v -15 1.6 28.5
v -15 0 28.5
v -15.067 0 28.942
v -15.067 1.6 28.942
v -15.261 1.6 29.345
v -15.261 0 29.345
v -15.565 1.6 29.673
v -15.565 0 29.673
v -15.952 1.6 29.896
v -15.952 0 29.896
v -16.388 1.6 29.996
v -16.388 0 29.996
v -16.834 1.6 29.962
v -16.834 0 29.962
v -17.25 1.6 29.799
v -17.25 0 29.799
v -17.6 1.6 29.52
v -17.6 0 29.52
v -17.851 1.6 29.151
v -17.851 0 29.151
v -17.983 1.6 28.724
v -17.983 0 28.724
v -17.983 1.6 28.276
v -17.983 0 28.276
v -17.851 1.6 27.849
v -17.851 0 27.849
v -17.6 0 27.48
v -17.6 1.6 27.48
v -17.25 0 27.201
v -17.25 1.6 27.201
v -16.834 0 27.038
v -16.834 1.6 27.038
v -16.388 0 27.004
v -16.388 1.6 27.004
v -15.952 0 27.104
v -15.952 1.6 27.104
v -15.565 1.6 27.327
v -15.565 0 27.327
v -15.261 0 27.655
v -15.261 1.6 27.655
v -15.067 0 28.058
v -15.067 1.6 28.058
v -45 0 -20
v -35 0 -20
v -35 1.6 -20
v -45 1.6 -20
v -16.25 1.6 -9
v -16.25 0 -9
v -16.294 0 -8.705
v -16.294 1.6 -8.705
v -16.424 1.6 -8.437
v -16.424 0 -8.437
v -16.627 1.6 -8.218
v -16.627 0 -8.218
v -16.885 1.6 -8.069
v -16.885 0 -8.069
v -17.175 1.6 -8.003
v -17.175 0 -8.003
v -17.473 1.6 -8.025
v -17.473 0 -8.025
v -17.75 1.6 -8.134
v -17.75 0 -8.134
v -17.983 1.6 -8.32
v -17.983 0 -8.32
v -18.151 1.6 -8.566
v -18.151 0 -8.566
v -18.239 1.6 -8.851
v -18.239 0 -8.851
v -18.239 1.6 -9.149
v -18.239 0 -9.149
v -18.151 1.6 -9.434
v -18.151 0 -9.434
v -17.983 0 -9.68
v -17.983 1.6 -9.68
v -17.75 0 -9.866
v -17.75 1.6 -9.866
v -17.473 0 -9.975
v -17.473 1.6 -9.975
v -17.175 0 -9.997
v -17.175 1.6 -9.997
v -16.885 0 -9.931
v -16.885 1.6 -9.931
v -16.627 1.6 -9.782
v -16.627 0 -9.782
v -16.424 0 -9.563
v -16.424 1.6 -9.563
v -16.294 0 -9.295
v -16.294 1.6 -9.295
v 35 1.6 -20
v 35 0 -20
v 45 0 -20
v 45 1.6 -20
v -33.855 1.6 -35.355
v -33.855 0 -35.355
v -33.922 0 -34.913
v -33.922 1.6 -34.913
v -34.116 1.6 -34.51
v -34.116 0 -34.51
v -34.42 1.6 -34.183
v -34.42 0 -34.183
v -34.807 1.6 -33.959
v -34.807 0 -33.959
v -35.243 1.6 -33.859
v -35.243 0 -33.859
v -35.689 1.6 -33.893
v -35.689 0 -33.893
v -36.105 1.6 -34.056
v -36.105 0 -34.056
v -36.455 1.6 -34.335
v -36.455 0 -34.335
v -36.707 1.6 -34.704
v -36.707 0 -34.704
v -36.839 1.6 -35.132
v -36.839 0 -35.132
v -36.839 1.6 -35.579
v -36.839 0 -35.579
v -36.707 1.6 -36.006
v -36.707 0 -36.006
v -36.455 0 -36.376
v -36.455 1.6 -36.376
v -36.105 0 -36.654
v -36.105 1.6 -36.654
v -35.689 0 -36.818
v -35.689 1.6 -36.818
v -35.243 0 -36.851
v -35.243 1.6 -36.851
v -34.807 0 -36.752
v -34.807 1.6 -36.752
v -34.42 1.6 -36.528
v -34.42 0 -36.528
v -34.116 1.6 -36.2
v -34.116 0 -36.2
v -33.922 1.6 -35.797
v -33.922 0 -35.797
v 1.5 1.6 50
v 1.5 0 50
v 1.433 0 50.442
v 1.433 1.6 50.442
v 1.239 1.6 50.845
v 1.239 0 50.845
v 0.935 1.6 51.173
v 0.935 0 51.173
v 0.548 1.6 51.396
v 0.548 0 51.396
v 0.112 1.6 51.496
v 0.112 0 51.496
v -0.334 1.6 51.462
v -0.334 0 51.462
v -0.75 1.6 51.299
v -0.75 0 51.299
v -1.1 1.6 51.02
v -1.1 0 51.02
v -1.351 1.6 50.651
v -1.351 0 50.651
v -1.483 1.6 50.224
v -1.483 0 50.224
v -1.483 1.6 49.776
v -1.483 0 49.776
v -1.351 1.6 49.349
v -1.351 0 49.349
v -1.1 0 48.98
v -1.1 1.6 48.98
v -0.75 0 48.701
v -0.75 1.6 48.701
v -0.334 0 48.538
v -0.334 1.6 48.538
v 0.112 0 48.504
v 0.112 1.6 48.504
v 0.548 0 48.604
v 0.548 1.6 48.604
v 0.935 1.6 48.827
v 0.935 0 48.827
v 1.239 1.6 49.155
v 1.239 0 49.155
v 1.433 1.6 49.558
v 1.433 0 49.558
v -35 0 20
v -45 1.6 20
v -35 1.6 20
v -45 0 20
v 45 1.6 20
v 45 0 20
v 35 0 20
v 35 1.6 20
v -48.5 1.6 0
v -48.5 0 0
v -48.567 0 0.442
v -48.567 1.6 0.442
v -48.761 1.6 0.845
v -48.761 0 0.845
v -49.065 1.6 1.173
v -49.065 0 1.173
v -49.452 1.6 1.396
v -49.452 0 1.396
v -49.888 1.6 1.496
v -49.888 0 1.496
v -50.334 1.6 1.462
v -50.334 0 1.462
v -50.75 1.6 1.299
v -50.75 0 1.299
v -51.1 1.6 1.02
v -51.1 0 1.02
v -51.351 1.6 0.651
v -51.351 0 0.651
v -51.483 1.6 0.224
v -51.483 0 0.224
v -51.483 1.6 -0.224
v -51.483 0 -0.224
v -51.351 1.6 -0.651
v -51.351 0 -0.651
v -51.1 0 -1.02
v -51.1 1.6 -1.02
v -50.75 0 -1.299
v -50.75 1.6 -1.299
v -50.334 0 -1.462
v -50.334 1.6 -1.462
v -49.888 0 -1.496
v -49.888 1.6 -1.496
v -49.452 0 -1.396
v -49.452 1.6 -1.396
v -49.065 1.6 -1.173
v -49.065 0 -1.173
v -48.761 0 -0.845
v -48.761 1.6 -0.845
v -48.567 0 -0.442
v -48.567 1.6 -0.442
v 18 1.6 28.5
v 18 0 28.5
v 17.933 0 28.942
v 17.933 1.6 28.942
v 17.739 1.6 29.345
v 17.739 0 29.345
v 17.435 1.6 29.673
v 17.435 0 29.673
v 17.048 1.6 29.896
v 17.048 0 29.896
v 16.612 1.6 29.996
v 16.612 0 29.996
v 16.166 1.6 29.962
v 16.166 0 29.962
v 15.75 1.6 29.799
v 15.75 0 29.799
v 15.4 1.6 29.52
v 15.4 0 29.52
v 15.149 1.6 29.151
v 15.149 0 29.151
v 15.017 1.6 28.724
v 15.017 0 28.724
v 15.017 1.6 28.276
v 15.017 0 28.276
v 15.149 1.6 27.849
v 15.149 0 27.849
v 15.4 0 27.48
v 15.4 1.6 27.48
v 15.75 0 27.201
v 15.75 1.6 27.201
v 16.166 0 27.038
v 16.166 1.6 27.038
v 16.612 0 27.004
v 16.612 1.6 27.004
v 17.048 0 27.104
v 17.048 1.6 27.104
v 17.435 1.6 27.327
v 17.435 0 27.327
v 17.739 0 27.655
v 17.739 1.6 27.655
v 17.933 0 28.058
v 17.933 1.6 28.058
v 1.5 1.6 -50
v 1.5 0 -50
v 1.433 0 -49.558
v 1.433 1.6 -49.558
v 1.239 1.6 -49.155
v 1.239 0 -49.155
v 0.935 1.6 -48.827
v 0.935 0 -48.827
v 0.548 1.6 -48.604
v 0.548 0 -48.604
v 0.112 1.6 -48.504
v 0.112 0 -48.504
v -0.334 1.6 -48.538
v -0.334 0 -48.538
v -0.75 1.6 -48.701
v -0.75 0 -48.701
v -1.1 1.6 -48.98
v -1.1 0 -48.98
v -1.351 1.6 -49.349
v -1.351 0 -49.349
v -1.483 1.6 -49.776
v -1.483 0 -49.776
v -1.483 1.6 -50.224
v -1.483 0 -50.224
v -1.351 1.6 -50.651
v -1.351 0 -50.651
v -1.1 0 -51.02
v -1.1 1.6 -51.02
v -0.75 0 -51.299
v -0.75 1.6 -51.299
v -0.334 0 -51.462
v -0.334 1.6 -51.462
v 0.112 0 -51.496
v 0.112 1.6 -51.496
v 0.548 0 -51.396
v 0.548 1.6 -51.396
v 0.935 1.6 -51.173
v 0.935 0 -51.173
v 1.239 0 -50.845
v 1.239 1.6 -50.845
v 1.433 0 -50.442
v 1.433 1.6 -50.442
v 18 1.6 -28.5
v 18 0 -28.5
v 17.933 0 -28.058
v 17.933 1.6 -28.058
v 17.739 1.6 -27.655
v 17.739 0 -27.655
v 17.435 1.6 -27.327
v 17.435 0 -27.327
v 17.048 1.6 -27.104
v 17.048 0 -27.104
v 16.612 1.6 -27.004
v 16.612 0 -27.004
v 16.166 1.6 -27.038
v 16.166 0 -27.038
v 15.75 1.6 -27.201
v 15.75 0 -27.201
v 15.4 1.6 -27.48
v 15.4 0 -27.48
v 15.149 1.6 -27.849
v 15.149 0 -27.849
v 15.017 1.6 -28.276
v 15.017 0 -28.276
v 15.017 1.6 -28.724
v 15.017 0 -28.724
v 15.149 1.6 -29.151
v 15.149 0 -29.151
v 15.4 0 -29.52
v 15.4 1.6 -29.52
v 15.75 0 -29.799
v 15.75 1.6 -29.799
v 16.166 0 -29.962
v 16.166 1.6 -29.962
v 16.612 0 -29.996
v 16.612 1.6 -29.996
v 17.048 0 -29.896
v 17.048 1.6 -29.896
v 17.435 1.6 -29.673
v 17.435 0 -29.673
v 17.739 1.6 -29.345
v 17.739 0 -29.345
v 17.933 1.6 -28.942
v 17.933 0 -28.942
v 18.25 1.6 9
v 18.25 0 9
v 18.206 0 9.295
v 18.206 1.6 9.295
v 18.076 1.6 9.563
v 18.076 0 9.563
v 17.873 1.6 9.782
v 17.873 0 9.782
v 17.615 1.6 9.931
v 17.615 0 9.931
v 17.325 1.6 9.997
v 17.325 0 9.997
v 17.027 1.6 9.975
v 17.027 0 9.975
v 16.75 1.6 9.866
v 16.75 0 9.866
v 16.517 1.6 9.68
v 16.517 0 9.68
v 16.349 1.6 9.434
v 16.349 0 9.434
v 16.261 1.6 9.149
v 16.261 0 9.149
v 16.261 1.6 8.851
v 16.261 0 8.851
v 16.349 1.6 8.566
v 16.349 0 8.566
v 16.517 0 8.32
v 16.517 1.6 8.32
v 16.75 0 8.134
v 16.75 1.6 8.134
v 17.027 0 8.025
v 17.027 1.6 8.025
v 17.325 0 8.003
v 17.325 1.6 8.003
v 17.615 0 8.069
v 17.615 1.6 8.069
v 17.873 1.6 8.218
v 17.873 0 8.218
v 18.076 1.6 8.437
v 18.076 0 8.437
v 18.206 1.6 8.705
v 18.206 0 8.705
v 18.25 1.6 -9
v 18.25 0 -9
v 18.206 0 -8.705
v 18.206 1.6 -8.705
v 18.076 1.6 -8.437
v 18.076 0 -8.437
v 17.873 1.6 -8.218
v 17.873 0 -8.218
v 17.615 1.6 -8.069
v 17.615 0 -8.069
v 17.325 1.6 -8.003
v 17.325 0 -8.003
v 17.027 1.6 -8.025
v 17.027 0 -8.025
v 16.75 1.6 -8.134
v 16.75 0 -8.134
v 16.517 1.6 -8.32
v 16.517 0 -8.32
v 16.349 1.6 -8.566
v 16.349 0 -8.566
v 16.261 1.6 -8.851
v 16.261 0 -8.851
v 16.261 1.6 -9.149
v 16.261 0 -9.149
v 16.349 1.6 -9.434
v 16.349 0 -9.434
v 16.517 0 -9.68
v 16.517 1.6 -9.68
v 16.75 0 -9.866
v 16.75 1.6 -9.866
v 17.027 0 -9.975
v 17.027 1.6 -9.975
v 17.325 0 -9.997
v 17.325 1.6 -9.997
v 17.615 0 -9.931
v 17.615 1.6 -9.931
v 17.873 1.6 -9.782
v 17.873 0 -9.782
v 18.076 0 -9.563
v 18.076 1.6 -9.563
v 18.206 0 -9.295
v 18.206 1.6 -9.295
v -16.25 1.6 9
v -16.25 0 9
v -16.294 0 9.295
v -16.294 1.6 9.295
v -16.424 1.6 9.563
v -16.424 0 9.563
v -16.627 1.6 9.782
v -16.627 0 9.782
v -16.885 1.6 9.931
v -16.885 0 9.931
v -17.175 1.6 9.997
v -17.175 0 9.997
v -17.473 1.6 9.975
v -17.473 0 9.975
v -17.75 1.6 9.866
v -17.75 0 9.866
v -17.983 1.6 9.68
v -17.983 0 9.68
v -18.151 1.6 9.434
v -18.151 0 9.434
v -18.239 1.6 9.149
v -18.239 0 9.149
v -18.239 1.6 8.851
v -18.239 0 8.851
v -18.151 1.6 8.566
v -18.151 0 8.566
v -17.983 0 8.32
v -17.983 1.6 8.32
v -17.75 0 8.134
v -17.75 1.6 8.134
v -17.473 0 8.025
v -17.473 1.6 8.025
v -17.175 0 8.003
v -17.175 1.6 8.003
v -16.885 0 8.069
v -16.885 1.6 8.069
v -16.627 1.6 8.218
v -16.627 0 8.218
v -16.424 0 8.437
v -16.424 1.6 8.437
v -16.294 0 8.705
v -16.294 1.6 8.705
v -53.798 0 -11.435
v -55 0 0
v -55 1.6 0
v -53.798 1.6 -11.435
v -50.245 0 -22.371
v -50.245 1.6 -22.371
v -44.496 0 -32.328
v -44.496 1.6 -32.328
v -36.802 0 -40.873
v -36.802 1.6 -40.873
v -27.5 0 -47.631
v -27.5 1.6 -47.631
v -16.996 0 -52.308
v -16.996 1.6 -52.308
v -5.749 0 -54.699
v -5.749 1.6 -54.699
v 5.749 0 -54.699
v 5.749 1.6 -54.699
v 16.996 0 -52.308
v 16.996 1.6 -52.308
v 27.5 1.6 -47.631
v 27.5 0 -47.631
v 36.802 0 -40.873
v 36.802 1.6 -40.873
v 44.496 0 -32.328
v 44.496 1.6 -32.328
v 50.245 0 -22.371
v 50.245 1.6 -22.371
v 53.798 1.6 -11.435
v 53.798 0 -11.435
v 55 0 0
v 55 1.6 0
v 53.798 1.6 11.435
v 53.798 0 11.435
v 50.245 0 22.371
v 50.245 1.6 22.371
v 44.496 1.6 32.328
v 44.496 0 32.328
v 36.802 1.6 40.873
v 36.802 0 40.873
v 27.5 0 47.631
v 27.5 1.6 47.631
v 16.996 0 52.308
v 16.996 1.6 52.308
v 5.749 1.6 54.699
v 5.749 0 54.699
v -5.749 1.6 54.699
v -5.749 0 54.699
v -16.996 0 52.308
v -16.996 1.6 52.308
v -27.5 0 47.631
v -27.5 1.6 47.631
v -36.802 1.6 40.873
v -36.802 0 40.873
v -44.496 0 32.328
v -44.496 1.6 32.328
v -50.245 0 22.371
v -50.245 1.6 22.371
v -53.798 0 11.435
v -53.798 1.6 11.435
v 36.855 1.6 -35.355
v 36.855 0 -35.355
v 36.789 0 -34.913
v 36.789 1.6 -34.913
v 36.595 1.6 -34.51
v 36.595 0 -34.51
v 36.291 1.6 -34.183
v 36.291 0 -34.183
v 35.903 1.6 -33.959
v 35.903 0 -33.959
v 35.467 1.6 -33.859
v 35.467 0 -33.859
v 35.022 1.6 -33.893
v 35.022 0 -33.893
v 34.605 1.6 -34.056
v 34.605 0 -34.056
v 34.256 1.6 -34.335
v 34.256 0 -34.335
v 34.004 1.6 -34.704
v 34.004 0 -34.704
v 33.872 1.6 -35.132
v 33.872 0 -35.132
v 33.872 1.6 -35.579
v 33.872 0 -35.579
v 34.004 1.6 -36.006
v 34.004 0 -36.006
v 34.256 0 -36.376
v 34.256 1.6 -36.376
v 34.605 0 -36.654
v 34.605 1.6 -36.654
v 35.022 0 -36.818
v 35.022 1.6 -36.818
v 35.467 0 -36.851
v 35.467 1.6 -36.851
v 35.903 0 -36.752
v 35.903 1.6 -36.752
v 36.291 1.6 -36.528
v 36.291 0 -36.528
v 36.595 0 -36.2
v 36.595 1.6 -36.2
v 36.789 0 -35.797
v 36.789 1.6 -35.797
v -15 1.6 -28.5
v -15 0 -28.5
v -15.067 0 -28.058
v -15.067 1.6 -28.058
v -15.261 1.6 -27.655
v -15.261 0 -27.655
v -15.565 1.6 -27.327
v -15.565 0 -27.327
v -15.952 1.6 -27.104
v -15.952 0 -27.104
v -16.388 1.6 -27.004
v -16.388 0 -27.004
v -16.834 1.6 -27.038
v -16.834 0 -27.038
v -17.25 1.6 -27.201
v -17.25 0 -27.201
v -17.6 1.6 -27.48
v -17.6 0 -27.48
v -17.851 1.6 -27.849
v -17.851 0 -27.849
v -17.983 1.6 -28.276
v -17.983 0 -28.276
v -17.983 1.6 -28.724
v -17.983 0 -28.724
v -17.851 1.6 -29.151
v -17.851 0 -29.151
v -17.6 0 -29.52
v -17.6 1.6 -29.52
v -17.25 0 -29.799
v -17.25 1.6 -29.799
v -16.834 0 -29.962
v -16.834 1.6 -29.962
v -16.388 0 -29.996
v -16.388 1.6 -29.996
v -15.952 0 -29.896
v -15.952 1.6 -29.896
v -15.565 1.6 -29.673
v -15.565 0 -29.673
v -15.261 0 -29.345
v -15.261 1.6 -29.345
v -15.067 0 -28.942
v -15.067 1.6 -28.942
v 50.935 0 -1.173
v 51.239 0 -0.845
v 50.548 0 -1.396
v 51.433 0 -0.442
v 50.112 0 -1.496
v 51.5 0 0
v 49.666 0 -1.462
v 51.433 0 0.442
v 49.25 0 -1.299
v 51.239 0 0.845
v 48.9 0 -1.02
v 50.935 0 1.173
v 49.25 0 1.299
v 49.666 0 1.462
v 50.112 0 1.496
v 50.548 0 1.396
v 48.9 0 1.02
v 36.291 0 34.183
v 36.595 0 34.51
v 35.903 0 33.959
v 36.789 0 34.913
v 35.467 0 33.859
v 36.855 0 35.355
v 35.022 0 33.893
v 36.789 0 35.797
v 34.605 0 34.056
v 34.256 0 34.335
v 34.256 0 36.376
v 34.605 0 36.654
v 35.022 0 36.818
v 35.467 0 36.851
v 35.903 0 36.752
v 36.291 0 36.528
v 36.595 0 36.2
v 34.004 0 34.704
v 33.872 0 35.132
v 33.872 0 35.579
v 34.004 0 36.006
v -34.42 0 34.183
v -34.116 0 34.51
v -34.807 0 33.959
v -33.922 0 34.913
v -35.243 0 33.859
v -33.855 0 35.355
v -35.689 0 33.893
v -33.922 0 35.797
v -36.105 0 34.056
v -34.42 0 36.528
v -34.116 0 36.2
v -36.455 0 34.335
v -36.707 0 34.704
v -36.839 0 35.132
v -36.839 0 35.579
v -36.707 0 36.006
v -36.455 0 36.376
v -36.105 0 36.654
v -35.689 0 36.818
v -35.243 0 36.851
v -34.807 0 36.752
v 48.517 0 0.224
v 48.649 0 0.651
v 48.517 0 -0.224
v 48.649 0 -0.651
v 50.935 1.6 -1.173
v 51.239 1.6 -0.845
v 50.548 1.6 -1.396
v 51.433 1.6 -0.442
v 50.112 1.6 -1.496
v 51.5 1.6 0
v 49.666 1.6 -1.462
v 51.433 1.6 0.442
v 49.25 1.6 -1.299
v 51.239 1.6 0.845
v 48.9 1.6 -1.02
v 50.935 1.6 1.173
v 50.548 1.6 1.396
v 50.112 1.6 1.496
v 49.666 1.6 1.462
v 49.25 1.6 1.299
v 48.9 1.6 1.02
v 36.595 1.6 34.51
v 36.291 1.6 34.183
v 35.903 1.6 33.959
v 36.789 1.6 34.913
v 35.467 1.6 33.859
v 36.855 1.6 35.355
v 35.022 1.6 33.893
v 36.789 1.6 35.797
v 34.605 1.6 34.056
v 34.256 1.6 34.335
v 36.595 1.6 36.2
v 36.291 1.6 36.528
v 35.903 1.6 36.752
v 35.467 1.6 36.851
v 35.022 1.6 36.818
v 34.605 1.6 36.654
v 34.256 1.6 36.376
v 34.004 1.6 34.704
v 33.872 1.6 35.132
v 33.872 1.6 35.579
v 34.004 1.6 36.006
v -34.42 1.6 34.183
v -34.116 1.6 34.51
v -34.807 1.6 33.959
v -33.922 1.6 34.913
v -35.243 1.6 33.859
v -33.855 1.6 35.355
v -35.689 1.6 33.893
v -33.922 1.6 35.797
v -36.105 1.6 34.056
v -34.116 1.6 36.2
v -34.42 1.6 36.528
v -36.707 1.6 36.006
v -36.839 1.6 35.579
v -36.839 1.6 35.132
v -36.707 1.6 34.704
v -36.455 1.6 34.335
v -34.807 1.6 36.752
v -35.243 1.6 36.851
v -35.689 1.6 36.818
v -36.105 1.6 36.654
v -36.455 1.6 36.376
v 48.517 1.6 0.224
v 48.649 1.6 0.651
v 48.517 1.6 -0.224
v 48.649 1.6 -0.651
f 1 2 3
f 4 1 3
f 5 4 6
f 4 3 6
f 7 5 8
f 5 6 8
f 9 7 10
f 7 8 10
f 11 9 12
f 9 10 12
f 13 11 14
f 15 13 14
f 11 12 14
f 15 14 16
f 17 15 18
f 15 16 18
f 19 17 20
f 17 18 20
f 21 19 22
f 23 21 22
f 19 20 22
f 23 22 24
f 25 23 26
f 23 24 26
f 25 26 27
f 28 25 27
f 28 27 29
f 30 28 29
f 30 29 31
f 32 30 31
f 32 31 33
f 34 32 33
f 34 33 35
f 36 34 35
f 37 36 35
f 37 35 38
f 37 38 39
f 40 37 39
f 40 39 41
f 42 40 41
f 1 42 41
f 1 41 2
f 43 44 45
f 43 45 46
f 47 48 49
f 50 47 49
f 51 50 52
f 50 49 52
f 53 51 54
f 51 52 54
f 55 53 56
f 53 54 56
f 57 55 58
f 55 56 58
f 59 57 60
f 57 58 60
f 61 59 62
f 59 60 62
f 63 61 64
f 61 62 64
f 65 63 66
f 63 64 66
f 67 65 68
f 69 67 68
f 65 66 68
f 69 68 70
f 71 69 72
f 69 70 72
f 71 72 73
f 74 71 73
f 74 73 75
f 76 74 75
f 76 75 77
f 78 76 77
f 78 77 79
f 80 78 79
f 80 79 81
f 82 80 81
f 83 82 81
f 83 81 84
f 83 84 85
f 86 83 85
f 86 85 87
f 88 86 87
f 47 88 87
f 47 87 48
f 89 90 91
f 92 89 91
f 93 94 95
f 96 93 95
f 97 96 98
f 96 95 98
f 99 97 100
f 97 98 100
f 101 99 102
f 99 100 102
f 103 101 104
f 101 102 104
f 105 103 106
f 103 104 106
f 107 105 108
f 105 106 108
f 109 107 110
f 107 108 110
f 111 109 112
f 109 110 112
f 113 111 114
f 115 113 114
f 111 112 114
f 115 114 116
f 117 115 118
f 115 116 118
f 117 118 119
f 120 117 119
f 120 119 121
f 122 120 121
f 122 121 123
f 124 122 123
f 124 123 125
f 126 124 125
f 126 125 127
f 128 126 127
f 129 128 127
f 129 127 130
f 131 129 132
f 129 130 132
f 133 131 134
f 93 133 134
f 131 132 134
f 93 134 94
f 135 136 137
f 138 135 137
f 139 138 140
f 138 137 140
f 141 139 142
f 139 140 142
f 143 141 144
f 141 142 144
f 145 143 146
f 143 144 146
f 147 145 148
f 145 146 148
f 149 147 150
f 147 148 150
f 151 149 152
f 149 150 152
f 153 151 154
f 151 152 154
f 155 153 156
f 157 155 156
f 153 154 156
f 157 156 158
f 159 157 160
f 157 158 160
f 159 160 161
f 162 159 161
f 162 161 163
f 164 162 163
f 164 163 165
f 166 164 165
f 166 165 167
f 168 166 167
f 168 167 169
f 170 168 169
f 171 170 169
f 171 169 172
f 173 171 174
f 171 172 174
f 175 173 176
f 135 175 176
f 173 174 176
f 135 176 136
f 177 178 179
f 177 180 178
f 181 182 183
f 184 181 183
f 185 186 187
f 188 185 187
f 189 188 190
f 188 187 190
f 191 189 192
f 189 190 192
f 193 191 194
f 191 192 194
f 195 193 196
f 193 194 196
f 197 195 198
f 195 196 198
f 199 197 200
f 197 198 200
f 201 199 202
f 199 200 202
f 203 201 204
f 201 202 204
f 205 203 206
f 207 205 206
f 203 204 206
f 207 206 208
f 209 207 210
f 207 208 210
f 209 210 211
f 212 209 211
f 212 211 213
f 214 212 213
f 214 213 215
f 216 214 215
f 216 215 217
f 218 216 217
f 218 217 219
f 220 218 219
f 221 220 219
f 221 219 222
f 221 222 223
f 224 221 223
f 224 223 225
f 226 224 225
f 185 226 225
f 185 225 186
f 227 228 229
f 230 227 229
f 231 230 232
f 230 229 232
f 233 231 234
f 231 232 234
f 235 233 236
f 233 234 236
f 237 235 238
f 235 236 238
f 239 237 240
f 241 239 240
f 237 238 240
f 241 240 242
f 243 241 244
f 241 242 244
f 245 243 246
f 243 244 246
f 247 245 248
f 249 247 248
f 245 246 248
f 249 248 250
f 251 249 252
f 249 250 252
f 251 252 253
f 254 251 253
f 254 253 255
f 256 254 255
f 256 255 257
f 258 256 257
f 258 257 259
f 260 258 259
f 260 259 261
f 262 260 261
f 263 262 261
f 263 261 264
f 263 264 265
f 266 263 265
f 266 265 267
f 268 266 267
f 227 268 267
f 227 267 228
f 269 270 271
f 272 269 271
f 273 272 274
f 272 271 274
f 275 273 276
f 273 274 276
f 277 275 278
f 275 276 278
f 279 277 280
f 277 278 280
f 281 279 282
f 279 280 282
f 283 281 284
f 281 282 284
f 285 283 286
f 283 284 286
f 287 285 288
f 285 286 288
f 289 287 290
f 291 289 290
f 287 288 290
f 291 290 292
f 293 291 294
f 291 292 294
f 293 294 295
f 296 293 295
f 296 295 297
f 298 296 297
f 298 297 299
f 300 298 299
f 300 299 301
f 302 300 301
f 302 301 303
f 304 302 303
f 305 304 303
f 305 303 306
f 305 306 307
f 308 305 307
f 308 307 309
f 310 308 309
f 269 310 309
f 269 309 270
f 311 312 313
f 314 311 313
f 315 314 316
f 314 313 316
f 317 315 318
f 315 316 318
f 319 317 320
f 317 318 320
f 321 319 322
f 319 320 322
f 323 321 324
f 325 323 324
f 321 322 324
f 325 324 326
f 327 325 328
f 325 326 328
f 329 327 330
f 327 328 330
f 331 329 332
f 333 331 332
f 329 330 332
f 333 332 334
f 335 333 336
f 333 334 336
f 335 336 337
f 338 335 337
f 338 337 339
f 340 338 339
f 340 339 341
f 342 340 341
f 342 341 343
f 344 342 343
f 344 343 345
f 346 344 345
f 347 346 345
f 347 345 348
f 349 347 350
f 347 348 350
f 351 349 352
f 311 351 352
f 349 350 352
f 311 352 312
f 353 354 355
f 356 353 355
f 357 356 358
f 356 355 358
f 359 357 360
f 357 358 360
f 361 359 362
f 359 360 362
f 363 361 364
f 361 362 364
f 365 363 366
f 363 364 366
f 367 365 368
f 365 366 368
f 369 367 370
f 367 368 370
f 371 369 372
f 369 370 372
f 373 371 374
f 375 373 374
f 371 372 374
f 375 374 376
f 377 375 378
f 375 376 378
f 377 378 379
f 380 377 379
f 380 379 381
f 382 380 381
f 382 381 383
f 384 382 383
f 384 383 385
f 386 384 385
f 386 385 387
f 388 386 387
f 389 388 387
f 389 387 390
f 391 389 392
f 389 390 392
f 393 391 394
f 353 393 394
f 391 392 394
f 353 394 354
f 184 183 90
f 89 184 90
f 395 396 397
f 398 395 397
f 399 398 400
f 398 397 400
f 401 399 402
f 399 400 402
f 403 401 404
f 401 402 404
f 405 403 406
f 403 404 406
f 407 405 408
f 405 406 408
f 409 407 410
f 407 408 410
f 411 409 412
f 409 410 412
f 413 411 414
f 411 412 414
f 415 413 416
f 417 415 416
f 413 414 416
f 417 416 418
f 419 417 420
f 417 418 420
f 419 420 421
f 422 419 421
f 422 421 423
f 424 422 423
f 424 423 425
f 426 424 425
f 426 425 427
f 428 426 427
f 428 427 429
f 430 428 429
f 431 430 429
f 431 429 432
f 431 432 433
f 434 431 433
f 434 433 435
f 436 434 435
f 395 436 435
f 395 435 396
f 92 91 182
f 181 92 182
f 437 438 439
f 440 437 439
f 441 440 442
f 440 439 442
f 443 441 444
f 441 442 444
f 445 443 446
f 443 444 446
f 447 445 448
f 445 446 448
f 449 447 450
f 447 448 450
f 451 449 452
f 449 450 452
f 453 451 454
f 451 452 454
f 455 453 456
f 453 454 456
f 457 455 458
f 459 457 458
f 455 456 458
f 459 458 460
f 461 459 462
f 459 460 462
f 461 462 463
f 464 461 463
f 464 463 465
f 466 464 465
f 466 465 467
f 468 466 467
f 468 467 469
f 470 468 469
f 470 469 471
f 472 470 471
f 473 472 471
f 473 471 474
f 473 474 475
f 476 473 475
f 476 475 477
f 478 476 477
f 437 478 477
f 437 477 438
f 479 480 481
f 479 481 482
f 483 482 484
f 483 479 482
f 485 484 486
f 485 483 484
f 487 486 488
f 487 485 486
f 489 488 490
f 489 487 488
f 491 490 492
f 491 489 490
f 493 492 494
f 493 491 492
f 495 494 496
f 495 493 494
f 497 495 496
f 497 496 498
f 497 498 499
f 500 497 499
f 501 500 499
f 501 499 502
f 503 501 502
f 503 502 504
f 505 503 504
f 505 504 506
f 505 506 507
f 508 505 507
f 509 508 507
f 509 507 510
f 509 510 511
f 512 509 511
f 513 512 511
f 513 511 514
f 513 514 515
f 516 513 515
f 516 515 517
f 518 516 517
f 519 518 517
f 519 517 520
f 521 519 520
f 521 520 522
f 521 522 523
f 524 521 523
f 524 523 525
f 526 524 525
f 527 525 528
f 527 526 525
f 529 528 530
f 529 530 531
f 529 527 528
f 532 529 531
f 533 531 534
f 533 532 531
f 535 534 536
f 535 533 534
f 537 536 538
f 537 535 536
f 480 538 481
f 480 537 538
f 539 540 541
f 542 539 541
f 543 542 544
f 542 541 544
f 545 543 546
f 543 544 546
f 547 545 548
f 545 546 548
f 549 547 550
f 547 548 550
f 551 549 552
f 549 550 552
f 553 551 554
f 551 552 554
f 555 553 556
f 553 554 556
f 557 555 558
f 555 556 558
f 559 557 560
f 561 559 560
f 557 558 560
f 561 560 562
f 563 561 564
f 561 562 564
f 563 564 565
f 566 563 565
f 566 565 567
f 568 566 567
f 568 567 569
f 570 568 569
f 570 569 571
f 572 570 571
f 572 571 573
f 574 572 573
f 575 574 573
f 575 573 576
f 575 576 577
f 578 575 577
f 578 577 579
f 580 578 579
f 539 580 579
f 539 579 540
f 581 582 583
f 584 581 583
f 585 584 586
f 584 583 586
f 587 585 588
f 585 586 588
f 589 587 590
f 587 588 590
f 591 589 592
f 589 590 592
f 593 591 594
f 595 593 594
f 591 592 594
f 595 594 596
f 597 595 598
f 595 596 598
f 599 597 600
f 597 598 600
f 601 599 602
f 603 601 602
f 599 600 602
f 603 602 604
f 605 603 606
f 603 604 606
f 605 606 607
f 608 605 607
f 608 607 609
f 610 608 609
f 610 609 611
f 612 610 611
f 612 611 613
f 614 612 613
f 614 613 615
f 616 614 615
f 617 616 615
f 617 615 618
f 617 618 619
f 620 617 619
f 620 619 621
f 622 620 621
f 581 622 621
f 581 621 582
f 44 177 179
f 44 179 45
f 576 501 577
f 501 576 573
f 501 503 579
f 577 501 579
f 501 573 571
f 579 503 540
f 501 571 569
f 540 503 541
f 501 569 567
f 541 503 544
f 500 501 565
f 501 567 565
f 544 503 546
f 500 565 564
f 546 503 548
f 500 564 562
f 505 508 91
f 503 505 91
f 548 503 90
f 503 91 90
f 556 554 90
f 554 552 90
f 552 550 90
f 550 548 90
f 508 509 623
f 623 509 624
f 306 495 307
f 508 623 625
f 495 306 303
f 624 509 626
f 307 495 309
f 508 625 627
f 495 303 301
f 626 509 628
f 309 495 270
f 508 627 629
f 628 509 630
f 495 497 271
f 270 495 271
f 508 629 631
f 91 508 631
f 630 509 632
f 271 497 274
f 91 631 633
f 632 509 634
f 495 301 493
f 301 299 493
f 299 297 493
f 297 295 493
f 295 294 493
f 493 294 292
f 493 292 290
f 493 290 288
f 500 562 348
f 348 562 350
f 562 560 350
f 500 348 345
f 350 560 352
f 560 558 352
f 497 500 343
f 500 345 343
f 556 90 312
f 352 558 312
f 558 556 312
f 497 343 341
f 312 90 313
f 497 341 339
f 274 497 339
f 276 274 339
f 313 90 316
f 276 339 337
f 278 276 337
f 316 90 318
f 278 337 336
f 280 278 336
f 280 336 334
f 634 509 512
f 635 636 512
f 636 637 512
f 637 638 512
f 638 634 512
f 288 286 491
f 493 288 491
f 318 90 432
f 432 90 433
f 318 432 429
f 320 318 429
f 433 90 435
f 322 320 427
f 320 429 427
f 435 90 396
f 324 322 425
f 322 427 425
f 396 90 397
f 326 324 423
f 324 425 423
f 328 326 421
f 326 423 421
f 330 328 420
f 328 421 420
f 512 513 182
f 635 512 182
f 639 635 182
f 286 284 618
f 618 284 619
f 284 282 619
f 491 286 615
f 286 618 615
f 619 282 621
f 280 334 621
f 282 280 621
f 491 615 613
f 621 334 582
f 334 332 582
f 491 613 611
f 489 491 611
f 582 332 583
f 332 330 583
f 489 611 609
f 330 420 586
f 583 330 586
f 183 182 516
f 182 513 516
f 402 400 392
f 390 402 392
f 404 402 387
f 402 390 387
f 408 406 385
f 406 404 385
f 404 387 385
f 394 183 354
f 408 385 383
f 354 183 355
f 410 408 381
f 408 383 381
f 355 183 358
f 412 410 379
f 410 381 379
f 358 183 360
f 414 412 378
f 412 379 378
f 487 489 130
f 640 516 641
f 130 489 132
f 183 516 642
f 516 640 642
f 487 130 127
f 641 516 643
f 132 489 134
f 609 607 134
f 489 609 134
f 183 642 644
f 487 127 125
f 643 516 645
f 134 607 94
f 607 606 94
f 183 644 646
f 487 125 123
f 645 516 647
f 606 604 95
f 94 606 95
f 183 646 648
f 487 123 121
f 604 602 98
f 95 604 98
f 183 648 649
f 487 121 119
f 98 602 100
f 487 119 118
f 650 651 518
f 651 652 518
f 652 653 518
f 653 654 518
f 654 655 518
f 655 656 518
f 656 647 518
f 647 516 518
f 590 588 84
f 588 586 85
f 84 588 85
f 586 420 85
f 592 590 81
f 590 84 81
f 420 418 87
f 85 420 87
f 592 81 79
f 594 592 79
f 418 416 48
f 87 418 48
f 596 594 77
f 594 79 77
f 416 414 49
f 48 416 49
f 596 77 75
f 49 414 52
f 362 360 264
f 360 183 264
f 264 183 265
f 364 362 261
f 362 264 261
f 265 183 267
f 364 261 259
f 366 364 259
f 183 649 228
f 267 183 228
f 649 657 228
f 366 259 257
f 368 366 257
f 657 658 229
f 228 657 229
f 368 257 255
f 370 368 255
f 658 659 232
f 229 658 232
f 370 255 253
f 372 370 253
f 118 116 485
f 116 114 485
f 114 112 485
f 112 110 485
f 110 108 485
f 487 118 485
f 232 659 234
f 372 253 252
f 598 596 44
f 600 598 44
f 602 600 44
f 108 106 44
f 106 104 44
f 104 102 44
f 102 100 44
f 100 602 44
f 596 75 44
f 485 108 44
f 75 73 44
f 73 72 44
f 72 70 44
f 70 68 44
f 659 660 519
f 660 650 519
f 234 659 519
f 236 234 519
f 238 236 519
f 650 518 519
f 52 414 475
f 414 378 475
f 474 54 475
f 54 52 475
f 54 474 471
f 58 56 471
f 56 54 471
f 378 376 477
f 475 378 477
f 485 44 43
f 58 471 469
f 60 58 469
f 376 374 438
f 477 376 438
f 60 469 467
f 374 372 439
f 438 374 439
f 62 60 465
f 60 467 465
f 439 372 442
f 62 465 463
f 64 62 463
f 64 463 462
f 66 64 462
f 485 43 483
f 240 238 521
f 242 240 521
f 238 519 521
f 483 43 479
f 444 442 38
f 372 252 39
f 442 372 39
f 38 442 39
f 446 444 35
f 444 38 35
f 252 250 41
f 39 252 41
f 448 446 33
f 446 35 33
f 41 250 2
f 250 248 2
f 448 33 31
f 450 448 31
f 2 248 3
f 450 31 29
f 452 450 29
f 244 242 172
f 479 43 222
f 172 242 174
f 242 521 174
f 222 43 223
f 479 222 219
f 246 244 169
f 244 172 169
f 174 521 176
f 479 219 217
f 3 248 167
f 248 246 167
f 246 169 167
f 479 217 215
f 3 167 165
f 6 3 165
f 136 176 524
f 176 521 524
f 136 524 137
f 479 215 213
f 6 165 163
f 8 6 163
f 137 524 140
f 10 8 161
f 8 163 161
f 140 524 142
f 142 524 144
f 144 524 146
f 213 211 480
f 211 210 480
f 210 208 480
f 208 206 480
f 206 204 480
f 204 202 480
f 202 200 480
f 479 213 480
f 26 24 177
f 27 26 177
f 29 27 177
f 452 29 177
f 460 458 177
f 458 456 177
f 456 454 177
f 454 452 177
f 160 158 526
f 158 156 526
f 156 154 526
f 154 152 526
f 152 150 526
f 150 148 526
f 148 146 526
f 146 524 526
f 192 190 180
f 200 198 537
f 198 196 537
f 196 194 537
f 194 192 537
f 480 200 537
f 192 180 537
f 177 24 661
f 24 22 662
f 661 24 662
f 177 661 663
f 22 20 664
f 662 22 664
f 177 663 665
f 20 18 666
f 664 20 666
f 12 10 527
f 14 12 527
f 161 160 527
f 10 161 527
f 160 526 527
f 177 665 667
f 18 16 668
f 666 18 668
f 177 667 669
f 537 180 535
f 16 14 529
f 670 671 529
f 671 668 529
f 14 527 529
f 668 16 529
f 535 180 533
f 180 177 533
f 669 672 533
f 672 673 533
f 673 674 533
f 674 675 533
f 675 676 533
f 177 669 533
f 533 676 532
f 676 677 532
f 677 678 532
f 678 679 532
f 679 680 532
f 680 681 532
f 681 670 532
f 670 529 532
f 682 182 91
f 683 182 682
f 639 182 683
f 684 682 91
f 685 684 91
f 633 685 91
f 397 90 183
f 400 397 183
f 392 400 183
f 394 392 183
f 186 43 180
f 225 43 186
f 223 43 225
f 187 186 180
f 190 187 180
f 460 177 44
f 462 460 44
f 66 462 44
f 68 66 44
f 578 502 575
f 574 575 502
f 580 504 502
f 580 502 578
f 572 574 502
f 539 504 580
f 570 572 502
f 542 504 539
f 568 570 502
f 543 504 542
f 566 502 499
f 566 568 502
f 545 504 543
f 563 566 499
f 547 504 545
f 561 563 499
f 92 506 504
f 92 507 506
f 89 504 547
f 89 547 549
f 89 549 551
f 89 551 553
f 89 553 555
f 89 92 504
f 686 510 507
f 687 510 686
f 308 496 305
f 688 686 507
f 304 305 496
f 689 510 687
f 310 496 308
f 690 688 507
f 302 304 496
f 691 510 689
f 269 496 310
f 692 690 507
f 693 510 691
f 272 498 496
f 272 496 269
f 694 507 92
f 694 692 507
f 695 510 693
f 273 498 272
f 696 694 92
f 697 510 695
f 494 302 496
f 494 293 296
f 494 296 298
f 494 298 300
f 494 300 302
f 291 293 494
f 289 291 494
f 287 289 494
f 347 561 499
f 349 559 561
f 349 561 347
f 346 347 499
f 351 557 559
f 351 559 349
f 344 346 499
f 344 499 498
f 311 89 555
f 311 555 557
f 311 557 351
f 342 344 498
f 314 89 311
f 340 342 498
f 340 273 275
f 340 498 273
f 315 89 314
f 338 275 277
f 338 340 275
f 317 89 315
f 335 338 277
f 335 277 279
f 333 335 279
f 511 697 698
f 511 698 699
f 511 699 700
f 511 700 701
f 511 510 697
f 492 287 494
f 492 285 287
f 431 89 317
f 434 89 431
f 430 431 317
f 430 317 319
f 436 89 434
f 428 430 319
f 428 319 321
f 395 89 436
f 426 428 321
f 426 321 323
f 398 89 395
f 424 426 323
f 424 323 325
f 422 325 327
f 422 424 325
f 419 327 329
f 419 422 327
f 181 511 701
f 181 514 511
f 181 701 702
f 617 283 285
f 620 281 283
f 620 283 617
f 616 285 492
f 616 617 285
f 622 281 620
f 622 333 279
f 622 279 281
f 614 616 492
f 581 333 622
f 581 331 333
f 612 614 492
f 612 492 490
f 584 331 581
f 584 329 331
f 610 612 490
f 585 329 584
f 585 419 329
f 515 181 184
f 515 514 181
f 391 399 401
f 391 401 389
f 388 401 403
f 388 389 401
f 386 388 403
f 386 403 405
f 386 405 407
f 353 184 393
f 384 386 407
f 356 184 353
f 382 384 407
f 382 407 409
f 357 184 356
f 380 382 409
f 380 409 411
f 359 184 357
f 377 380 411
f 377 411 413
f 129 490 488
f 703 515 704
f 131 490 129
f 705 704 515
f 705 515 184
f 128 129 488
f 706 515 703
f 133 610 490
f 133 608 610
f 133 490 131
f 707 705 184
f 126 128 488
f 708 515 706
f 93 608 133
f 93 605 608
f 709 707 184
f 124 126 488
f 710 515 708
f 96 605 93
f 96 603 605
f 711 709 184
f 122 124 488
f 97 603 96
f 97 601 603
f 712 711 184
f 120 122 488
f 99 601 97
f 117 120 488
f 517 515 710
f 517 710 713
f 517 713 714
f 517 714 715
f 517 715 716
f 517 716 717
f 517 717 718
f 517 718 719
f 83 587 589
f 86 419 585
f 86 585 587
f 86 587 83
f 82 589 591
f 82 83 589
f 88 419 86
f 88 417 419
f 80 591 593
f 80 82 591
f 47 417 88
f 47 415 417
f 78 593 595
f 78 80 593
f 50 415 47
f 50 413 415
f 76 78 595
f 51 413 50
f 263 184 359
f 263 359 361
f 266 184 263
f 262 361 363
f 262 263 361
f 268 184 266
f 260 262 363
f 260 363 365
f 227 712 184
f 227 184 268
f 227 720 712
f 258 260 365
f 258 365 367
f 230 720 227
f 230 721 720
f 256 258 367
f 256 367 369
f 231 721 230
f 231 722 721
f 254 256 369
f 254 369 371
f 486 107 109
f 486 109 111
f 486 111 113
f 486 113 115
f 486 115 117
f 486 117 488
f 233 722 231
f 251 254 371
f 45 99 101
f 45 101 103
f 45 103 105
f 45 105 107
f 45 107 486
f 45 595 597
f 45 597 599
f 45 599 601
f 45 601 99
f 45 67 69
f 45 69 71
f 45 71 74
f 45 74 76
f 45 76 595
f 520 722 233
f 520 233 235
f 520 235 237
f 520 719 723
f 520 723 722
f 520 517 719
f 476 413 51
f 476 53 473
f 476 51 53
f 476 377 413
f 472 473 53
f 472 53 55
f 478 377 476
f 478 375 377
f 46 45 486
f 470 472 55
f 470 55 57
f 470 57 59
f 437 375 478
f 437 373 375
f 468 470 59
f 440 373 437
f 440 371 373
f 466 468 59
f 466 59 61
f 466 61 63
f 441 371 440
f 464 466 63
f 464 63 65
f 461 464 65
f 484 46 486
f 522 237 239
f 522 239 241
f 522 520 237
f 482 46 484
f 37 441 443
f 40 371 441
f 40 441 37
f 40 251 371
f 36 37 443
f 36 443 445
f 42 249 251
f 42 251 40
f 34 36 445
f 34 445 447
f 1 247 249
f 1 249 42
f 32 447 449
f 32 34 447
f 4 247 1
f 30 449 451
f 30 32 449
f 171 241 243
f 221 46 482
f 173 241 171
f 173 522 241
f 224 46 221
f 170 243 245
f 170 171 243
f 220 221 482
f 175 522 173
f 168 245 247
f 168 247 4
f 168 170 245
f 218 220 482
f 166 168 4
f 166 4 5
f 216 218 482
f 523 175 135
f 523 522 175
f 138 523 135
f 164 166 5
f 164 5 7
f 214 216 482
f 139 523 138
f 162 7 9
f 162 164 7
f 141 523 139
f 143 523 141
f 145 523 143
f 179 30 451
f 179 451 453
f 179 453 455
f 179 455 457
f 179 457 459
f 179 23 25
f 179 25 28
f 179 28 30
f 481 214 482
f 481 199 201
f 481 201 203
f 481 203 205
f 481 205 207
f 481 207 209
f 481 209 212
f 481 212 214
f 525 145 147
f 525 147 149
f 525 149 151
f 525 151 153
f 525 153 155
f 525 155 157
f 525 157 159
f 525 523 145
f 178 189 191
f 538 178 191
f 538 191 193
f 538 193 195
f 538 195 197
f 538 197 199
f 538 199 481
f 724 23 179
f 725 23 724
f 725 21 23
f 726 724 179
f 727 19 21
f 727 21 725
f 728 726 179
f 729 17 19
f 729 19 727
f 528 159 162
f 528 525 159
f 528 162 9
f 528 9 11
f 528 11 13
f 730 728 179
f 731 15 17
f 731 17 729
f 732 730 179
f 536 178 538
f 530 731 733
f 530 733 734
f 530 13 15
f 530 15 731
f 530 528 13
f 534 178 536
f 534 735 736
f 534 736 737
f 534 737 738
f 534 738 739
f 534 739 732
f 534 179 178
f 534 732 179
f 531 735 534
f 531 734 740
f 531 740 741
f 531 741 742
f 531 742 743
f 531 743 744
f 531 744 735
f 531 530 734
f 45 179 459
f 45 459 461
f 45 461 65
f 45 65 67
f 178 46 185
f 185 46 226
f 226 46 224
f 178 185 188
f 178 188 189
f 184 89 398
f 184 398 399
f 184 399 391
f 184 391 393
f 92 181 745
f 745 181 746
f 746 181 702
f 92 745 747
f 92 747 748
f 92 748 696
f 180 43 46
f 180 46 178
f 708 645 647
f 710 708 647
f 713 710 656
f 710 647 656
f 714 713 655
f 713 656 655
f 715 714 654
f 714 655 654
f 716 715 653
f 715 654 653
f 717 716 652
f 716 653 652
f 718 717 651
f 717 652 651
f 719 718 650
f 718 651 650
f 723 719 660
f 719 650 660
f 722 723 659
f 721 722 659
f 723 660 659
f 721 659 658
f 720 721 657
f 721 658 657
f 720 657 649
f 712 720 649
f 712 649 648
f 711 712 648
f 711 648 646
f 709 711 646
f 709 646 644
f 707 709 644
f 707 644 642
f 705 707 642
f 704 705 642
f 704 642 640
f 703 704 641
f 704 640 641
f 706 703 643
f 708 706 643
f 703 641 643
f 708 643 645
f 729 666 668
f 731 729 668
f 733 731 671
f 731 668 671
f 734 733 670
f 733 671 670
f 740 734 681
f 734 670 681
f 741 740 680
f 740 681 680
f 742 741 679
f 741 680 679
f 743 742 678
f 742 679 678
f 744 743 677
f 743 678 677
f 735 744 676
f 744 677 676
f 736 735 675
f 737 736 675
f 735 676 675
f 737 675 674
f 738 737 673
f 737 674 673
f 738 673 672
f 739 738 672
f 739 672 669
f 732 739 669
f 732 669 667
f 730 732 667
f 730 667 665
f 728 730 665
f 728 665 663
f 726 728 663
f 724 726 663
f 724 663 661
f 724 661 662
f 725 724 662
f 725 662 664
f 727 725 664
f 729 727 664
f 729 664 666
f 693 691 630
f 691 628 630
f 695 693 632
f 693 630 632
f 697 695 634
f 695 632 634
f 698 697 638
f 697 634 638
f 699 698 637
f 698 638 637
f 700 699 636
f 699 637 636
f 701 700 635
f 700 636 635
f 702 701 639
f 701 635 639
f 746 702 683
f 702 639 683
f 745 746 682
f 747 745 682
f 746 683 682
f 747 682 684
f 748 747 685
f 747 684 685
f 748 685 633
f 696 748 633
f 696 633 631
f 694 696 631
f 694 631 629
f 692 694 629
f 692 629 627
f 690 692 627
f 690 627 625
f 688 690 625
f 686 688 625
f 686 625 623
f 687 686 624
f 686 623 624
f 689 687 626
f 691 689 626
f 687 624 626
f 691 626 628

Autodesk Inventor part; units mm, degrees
ref_plane "YZ Plane" through (0, 0, 0) normal (1, 0, 0) x (0, 1, 0)
ref_plane "XZ Plane" through (0, 0, 0) normal (0, 1, 0) x (-1, 0, 0)
ref_plane "XY Plane" through (0, 0, 0) normal (0, 0, 1) x (1, 0, 0)
sketch "Эскиз1" plane through (0, 0, 0) normal (0, 1, 0) x (-1, 0, 0)
  circle A0 centre (0, 0) radius 55
  line L0 (79.4555, 0) -> (-79.4555, 0)
  line L1 (0, -103.8803) -> (0, 88.3129)
  dimension "d0" = 110
extrude "Выдавливание1" add sketch "Эскиз1" along normal blind 1.6
sketch "Эскиз2" plane through (0, 0, 0) normal (0, -1, 0) x (1, 0, 0)
  circle A0 centre (0, 0) radius 55 projected
  line L0 (0, -103.8803) -> (0, 88.3129) projected
  line L1 (-79.4555, 0) -> (79.4555, 0) projected
  line L2 (11.5, -13.3) -> (23, -13.3)
  line L3 (23, -13.3) -> (23, 13.3)
  line L4 (23, 13.3) -> (11.5, 13.3)
  line L5 (11.5, 13.3) -> (11.5, -13.3)
  line L6 (35, -20) -> (45, -20)
  line L7 (45, -20) -> (45, 20)
  line L8 (45, 20) -> (35, 20)
  line L9 (35, 20) -> (35, -20)
  line L10 (17.25, -13.3) -> (17.25, 13.3)
  circle A1 centre (17.25, -9) radius 1
  circle A2 centre (17.25, 9) radius 1
  line L11 (3, 6) -> (33, 6)
  line L12 (33, 6) -> (33, -6)
  line L13 (33, -6) -> (3, -6)
  line L14 (3, -6) -> (3, 6)
  line L15 (-11.5, -13.3) -> (-23, -13.3)
  line L16 (-23, -13.3) -> (-23, 13.3)
  line L17 (-23, 13.3) -> (-11.5, 13.3)
  line L18 (-11.5, 13.3) -> (-11.5, -13.3)
  line L19 (-35, -20) -> (-45, -20)
  line L20 (-45, -20) -> (-45, 20)
  line L21 (-45, 20) -> (-35, 20)
  line L22 (-35, 20) -> (-35, -20)
  line L23 (-17.25, -13.3) -> (-17.25, 13.3)
  circle A3 centre (-17.25, -9) radius 1
  circle A4 centre (-17.25, 9) radius 1
  line L24 (-3, 6) -> (-33, 6)
  line L25 (-33, 6) -> (-33, -6)
  line L26 (-33, -6) -> (-3, -6)
  line L27 (-3, -6) -> (-3, 6)
  circle A5 centre (0, 0) radius 50
  circle A6 centre (0, -50) radius 1.5
  circle A7 centre (50, 0) radius 1.5
  circle A8 centre (0, 50) radius 1.5
  circle A9 centre (-50, 0) radius 1.5
  circle A10 centre (35.3553, -35.3553) radius 1.5
  circle A11 centre (50, 0) radius 1.5
  circle A12 centre (35.3553, 35.3553) radius 1.5
  circle A13 centre (0, 50) radius 1.5
  circle A14 centre (-35.3553, 35.3553) radius 1.5
  circle A15 centre (-50, 0) radius 1.5
  circle A16 centre (-35.3553, -35.3553) radius 1.5
  dimension "d6" = 11.5
  dimension "d7" = 26.6
  dimension "d9" = 10
  dimension "d10" = 40
  dimension "d11" = 45
  dimension "d12" = 12
  dimension "d13" = 2
  dimension "d14" = 18
  dimension "d15" = 2
  dimension "d16" = 30
  dimension "d17" = 12
  dimension "d18" = 2
  dimension "d21" = 100
  dimension "d22" = 3
  dimension "d23" = 3
  dimension "d25" = 3
  dimension "d26" = 3
  dimension "d30" = 360
extrude "Выдавливание2" cut sketch "Эскиз2" against normal blind 1.6 contours A7 A5 L1 | L1 A5 A7 | A8 A5 L0 | L0 A5 A8 | A6 A5 L0 | L0 A5 A6 | A5 A7 L1 | L1 A7 A5 | A9 A5 L1 | L1 A5 A9 | A5 A8 L0 | L0 A8 A5 | A5 A6 L0 | L0 A6 A5 | A12 A5 | A5 A12 | A10 A5 | A5 A10 | A5 A9 L1 | L1 A9 A5 | A14 A5 | A5 A14 | A16 A5 | A5 A16 | L7 L6 L9 L1 | L1 L9 L8 L7 | L20 L21 L22 L1 | L1 L22 L19 L20 | A3 L23 | L23 A3 | A4 L23 | L23 A4 | A1 L10 | L10 A1 | A2 L10 | L10 A2
sketch "Эскиз3" plane through (0, 0, 0) normal (0, -1, 0) x (1, 0, 0)
  circle A0 centre (50, 0) radius 1.5 projected
  circle A1 centre (-50, 0) radius 1.5 projected
  circle A2 centre (-17.25, 9) radius 1 projected
  line L0 (35, -20) -> (35, 20) projected
  line L1 (35, 20) -> (45, 20) projected
  line L2 (45, 20) -> (45, -20) projected
  line L3 (45, -20) -> (35, -20) projected
  line L4 (-35, -20) -> (-45, -20) projected
  line L5 (-45, -20) -> (-45, 20) projected
  line L6 (-45, 20) -> (-35, 20) projected
  line L7 (-35, 20) -> (-35, -20) projected
  circle A3 centre (-35.3553, 35.3553) radius 1.5 projected
  circle A4 centre (35.3553, -35.3553) radius 1.5 projected
  circle A5 centre (35.3553, 35.3553) radius 1.5 projected
  circle A6 centre (-35.3553, -35.3553) radius 1.5 projected
  circle A7 centre (17.25, 9) radius 1 projected
  circle A8 centre (17.25, -9) radius 1 projected
  circle A9 centre (-17.25, -9) radius 1 projected
  circle A10 centre (0, 50) radius 1.5 projected
  circle A11 centre (0, -50) radius 1.5 projected
  circle A12 centre (0, 0) radius 55 projected
  line L8 (-79.4555, 0) -> (79.4555, 0) projected
  line L9 (0, -103.8803) -> (0, 88.3129) projected
  circle A13 centre (0, 0) radius 50 projected
  circle A14 centre (-35.3553, -35.3553) radius 1.5 projected
  line L10 (23, 13.3) -> (11.5, 13.3) projected
  line L11 (-21.1, -39.0646) -> (21.1, -39.0646)
  line L12 (21.1, -39.0646) -> (21.1, 37.2354)
  line L13 (21.1, 37.2354) -> (-21.1, 37.2354)
  line L14 (-21.1, 37.2354) -> (-21.1, -39.0646)
  circle A15 centre (-16.5, -28.5) radius 1.5
  circle A16 centre (16.5, -28.5) radius 1.5
  circle A17 centre (16.5, 28.5) radius 1.5
  circle A18 centre (-16.5, 28.5) radius 1.5
  dimension "d34" = 76.3
  dimension "d35" = 42.2
  dimension "d37" = 3
  dimension "d38" = 3
  dimension "d39" = 3
  dimension "d40" = 3
  dimension "d42" = 33
  dimension "d43" = 57
extrude "Выдавливание3" cut sketch "Эскиз3" against normal blind 1.6 contours A15 | A16 | A17 | A18
properties part number "pcbCase"
